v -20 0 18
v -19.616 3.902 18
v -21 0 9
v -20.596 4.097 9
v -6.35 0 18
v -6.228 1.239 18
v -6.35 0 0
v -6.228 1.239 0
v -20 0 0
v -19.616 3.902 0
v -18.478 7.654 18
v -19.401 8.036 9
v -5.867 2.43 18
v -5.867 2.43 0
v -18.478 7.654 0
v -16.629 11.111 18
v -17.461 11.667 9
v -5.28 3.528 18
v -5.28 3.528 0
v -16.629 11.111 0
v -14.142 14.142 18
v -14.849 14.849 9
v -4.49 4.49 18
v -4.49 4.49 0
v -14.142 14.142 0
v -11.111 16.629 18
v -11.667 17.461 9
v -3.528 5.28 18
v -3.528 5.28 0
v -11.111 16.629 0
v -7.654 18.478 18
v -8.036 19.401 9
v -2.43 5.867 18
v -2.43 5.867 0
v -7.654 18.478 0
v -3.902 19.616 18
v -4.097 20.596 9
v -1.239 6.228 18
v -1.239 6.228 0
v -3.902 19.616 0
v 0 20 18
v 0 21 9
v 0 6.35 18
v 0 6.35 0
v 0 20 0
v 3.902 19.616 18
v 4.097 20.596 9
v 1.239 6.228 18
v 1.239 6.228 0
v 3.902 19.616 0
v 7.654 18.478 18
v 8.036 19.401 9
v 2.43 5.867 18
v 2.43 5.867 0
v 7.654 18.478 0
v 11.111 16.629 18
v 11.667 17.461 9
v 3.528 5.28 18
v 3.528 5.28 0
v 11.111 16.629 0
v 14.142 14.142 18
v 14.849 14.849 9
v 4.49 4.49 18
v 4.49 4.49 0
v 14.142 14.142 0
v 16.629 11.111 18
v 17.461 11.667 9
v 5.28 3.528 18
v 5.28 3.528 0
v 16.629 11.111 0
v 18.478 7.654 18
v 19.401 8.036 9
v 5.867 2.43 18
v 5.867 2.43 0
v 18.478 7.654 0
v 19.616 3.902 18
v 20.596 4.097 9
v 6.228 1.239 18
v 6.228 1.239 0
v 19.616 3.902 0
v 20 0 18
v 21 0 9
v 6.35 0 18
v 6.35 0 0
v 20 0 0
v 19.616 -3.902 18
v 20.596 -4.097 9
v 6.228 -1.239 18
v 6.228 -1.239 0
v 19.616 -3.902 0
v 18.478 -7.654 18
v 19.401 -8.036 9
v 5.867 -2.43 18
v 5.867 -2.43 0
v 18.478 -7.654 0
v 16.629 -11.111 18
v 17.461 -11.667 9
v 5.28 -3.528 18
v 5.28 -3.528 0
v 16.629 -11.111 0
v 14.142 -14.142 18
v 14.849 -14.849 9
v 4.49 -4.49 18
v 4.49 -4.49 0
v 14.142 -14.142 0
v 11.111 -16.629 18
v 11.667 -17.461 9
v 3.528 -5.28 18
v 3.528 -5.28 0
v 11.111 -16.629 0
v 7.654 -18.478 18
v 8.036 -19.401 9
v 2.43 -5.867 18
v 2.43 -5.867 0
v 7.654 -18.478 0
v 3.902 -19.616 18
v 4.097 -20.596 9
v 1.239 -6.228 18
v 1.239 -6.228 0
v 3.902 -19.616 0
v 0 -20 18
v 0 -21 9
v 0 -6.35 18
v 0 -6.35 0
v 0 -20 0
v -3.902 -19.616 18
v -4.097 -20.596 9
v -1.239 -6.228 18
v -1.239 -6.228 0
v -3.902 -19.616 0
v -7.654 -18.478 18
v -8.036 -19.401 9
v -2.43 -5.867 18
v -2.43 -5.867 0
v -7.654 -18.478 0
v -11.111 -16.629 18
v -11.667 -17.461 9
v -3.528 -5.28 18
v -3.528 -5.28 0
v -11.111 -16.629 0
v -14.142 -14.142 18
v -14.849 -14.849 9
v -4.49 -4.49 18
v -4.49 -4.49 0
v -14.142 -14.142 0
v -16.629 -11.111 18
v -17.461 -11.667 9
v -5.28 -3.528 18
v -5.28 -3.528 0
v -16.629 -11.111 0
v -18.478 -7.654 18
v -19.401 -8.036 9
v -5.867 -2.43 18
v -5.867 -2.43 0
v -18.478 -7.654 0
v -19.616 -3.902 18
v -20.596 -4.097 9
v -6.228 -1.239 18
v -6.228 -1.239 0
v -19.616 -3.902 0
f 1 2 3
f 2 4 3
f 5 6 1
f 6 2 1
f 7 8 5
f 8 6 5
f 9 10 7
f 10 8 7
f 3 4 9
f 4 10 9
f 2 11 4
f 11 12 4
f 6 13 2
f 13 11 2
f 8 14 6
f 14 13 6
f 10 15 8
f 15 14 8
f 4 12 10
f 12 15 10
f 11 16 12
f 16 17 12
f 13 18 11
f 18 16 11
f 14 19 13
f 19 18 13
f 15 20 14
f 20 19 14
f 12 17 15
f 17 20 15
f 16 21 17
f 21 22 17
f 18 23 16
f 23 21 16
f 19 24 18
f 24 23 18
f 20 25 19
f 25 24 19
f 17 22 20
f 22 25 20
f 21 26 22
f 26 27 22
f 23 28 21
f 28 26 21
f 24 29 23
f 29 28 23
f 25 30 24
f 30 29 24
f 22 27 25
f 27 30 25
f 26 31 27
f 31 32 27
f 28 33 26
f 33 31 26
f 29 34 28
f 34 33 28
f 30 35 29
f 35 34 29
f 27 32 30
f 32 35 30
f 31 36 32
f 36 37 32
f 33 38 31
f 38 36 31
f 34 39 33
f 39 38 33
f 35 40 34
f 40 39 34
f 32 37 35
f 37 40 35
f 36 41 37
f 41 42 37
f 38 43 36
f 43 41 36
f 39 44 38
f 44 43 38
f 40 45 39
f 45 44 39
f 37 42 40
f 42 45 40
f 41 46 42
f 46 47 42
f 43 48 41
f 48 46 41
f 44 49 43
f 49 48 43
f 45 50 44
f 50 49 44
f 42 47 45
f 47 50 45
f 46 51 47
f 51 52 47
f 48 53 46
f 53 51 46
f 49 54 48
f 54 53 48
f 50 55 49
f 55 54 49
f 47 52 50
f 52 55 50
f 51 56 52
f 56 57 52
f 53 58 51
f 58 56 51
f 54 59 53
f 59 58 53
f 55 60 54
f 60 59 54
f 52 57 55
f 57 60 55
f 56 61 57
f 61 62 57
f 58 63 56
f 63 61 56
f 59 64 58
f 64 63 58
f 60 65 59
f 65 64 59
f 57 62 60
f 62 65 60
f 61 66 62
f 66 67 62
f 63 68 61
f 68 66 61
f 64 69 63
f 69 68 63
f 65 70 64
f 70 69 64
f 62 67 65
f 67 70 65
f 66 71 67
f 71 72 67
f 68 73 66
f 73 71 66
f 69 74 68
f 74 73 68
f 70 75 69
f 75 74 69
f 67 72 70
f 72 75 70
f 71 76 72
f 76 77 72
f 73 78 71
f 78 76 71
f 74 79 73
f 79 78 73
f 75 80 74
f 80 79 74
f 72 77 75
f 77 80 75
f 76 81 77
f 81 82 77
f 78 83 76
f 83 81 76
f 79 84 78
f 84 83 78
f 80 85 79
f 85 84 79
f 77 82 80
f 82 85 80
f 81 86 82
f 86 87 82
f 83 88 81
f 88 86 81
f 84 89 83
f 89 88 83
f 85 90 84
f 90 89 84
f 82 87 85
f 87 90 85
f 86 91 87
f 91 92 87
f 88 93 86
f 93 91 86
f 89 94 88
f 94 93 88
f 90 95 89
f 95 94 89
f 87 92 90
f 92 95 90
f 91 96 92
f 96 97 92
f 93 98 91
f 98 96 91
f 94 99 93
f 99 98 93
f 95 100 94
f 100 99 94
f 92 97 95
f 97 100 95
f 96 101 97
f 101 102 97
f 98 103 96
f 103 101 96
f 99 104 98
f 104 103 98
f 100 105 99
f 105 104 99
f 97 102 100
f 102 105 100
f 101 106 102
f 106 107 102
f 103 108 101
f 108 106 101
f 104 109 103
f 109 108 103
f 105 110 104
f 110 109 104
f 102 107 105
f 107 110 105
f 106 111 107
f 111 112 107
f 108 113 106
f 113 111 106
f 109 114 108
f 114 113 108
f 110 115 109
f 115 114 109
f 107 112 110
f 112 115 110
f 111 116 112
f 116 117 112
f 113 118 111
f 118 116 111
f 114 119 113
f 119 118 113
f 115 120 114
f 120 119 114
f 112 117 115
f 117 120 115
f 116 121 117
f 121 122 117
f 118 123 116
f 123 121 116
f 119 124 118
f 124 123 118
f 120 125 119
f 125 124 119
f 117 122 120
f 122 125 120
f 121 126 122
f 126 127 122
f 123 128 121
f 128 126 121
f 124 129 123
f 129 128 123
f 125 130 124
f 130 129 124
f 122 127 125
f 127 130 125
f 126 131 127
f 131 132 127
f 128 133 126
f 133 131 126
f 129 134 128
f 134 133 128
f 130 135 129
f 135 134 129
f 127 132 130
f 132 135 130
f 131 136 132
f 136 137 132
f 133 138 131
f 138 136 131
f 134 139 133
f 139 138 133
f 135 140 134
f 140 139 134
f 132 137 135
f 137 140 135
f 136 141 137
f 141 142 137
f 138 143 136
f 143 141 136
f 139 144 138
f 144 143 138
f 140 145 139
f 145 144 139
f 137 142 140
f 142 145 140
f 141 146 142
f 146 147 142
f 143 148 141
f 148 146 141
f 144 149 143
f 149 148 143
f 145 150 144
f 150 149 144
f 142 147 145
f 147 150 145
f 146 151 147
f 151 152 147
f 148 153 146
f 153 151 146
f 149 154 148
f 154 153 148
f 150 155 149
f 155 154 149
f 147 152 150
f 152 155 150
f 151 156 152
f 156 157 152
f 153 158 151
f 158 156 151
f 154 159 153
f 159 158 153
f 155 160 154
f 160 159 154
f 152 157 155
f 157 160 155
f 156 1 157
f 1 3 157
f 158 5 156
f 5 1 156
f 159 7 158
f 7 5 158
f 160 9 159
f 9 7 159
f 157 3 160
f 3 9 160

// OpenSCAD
$fn = 32;

// ----------------------------------------------------------------------
// Belt roller: 40 mm barrel, 18 mm wide, bore 12.7 mm
// ----------------------------------------------------------------------

// --- parameters (mm) ---
bore_d = 12.7;            // bore
barrel_d = 40;            // barrel diameter
roller_w = 18;            // roller width
crown = 1;                // crown height at mid width

roller_profile = [[6.35, 0], [20, 0], [21, 9], [20, 18], [6.35, 18]];

/* the profile stays clear of the axis, so the bore comes out of the revolve */
rotate_extrude() polygon(roller_profile);
